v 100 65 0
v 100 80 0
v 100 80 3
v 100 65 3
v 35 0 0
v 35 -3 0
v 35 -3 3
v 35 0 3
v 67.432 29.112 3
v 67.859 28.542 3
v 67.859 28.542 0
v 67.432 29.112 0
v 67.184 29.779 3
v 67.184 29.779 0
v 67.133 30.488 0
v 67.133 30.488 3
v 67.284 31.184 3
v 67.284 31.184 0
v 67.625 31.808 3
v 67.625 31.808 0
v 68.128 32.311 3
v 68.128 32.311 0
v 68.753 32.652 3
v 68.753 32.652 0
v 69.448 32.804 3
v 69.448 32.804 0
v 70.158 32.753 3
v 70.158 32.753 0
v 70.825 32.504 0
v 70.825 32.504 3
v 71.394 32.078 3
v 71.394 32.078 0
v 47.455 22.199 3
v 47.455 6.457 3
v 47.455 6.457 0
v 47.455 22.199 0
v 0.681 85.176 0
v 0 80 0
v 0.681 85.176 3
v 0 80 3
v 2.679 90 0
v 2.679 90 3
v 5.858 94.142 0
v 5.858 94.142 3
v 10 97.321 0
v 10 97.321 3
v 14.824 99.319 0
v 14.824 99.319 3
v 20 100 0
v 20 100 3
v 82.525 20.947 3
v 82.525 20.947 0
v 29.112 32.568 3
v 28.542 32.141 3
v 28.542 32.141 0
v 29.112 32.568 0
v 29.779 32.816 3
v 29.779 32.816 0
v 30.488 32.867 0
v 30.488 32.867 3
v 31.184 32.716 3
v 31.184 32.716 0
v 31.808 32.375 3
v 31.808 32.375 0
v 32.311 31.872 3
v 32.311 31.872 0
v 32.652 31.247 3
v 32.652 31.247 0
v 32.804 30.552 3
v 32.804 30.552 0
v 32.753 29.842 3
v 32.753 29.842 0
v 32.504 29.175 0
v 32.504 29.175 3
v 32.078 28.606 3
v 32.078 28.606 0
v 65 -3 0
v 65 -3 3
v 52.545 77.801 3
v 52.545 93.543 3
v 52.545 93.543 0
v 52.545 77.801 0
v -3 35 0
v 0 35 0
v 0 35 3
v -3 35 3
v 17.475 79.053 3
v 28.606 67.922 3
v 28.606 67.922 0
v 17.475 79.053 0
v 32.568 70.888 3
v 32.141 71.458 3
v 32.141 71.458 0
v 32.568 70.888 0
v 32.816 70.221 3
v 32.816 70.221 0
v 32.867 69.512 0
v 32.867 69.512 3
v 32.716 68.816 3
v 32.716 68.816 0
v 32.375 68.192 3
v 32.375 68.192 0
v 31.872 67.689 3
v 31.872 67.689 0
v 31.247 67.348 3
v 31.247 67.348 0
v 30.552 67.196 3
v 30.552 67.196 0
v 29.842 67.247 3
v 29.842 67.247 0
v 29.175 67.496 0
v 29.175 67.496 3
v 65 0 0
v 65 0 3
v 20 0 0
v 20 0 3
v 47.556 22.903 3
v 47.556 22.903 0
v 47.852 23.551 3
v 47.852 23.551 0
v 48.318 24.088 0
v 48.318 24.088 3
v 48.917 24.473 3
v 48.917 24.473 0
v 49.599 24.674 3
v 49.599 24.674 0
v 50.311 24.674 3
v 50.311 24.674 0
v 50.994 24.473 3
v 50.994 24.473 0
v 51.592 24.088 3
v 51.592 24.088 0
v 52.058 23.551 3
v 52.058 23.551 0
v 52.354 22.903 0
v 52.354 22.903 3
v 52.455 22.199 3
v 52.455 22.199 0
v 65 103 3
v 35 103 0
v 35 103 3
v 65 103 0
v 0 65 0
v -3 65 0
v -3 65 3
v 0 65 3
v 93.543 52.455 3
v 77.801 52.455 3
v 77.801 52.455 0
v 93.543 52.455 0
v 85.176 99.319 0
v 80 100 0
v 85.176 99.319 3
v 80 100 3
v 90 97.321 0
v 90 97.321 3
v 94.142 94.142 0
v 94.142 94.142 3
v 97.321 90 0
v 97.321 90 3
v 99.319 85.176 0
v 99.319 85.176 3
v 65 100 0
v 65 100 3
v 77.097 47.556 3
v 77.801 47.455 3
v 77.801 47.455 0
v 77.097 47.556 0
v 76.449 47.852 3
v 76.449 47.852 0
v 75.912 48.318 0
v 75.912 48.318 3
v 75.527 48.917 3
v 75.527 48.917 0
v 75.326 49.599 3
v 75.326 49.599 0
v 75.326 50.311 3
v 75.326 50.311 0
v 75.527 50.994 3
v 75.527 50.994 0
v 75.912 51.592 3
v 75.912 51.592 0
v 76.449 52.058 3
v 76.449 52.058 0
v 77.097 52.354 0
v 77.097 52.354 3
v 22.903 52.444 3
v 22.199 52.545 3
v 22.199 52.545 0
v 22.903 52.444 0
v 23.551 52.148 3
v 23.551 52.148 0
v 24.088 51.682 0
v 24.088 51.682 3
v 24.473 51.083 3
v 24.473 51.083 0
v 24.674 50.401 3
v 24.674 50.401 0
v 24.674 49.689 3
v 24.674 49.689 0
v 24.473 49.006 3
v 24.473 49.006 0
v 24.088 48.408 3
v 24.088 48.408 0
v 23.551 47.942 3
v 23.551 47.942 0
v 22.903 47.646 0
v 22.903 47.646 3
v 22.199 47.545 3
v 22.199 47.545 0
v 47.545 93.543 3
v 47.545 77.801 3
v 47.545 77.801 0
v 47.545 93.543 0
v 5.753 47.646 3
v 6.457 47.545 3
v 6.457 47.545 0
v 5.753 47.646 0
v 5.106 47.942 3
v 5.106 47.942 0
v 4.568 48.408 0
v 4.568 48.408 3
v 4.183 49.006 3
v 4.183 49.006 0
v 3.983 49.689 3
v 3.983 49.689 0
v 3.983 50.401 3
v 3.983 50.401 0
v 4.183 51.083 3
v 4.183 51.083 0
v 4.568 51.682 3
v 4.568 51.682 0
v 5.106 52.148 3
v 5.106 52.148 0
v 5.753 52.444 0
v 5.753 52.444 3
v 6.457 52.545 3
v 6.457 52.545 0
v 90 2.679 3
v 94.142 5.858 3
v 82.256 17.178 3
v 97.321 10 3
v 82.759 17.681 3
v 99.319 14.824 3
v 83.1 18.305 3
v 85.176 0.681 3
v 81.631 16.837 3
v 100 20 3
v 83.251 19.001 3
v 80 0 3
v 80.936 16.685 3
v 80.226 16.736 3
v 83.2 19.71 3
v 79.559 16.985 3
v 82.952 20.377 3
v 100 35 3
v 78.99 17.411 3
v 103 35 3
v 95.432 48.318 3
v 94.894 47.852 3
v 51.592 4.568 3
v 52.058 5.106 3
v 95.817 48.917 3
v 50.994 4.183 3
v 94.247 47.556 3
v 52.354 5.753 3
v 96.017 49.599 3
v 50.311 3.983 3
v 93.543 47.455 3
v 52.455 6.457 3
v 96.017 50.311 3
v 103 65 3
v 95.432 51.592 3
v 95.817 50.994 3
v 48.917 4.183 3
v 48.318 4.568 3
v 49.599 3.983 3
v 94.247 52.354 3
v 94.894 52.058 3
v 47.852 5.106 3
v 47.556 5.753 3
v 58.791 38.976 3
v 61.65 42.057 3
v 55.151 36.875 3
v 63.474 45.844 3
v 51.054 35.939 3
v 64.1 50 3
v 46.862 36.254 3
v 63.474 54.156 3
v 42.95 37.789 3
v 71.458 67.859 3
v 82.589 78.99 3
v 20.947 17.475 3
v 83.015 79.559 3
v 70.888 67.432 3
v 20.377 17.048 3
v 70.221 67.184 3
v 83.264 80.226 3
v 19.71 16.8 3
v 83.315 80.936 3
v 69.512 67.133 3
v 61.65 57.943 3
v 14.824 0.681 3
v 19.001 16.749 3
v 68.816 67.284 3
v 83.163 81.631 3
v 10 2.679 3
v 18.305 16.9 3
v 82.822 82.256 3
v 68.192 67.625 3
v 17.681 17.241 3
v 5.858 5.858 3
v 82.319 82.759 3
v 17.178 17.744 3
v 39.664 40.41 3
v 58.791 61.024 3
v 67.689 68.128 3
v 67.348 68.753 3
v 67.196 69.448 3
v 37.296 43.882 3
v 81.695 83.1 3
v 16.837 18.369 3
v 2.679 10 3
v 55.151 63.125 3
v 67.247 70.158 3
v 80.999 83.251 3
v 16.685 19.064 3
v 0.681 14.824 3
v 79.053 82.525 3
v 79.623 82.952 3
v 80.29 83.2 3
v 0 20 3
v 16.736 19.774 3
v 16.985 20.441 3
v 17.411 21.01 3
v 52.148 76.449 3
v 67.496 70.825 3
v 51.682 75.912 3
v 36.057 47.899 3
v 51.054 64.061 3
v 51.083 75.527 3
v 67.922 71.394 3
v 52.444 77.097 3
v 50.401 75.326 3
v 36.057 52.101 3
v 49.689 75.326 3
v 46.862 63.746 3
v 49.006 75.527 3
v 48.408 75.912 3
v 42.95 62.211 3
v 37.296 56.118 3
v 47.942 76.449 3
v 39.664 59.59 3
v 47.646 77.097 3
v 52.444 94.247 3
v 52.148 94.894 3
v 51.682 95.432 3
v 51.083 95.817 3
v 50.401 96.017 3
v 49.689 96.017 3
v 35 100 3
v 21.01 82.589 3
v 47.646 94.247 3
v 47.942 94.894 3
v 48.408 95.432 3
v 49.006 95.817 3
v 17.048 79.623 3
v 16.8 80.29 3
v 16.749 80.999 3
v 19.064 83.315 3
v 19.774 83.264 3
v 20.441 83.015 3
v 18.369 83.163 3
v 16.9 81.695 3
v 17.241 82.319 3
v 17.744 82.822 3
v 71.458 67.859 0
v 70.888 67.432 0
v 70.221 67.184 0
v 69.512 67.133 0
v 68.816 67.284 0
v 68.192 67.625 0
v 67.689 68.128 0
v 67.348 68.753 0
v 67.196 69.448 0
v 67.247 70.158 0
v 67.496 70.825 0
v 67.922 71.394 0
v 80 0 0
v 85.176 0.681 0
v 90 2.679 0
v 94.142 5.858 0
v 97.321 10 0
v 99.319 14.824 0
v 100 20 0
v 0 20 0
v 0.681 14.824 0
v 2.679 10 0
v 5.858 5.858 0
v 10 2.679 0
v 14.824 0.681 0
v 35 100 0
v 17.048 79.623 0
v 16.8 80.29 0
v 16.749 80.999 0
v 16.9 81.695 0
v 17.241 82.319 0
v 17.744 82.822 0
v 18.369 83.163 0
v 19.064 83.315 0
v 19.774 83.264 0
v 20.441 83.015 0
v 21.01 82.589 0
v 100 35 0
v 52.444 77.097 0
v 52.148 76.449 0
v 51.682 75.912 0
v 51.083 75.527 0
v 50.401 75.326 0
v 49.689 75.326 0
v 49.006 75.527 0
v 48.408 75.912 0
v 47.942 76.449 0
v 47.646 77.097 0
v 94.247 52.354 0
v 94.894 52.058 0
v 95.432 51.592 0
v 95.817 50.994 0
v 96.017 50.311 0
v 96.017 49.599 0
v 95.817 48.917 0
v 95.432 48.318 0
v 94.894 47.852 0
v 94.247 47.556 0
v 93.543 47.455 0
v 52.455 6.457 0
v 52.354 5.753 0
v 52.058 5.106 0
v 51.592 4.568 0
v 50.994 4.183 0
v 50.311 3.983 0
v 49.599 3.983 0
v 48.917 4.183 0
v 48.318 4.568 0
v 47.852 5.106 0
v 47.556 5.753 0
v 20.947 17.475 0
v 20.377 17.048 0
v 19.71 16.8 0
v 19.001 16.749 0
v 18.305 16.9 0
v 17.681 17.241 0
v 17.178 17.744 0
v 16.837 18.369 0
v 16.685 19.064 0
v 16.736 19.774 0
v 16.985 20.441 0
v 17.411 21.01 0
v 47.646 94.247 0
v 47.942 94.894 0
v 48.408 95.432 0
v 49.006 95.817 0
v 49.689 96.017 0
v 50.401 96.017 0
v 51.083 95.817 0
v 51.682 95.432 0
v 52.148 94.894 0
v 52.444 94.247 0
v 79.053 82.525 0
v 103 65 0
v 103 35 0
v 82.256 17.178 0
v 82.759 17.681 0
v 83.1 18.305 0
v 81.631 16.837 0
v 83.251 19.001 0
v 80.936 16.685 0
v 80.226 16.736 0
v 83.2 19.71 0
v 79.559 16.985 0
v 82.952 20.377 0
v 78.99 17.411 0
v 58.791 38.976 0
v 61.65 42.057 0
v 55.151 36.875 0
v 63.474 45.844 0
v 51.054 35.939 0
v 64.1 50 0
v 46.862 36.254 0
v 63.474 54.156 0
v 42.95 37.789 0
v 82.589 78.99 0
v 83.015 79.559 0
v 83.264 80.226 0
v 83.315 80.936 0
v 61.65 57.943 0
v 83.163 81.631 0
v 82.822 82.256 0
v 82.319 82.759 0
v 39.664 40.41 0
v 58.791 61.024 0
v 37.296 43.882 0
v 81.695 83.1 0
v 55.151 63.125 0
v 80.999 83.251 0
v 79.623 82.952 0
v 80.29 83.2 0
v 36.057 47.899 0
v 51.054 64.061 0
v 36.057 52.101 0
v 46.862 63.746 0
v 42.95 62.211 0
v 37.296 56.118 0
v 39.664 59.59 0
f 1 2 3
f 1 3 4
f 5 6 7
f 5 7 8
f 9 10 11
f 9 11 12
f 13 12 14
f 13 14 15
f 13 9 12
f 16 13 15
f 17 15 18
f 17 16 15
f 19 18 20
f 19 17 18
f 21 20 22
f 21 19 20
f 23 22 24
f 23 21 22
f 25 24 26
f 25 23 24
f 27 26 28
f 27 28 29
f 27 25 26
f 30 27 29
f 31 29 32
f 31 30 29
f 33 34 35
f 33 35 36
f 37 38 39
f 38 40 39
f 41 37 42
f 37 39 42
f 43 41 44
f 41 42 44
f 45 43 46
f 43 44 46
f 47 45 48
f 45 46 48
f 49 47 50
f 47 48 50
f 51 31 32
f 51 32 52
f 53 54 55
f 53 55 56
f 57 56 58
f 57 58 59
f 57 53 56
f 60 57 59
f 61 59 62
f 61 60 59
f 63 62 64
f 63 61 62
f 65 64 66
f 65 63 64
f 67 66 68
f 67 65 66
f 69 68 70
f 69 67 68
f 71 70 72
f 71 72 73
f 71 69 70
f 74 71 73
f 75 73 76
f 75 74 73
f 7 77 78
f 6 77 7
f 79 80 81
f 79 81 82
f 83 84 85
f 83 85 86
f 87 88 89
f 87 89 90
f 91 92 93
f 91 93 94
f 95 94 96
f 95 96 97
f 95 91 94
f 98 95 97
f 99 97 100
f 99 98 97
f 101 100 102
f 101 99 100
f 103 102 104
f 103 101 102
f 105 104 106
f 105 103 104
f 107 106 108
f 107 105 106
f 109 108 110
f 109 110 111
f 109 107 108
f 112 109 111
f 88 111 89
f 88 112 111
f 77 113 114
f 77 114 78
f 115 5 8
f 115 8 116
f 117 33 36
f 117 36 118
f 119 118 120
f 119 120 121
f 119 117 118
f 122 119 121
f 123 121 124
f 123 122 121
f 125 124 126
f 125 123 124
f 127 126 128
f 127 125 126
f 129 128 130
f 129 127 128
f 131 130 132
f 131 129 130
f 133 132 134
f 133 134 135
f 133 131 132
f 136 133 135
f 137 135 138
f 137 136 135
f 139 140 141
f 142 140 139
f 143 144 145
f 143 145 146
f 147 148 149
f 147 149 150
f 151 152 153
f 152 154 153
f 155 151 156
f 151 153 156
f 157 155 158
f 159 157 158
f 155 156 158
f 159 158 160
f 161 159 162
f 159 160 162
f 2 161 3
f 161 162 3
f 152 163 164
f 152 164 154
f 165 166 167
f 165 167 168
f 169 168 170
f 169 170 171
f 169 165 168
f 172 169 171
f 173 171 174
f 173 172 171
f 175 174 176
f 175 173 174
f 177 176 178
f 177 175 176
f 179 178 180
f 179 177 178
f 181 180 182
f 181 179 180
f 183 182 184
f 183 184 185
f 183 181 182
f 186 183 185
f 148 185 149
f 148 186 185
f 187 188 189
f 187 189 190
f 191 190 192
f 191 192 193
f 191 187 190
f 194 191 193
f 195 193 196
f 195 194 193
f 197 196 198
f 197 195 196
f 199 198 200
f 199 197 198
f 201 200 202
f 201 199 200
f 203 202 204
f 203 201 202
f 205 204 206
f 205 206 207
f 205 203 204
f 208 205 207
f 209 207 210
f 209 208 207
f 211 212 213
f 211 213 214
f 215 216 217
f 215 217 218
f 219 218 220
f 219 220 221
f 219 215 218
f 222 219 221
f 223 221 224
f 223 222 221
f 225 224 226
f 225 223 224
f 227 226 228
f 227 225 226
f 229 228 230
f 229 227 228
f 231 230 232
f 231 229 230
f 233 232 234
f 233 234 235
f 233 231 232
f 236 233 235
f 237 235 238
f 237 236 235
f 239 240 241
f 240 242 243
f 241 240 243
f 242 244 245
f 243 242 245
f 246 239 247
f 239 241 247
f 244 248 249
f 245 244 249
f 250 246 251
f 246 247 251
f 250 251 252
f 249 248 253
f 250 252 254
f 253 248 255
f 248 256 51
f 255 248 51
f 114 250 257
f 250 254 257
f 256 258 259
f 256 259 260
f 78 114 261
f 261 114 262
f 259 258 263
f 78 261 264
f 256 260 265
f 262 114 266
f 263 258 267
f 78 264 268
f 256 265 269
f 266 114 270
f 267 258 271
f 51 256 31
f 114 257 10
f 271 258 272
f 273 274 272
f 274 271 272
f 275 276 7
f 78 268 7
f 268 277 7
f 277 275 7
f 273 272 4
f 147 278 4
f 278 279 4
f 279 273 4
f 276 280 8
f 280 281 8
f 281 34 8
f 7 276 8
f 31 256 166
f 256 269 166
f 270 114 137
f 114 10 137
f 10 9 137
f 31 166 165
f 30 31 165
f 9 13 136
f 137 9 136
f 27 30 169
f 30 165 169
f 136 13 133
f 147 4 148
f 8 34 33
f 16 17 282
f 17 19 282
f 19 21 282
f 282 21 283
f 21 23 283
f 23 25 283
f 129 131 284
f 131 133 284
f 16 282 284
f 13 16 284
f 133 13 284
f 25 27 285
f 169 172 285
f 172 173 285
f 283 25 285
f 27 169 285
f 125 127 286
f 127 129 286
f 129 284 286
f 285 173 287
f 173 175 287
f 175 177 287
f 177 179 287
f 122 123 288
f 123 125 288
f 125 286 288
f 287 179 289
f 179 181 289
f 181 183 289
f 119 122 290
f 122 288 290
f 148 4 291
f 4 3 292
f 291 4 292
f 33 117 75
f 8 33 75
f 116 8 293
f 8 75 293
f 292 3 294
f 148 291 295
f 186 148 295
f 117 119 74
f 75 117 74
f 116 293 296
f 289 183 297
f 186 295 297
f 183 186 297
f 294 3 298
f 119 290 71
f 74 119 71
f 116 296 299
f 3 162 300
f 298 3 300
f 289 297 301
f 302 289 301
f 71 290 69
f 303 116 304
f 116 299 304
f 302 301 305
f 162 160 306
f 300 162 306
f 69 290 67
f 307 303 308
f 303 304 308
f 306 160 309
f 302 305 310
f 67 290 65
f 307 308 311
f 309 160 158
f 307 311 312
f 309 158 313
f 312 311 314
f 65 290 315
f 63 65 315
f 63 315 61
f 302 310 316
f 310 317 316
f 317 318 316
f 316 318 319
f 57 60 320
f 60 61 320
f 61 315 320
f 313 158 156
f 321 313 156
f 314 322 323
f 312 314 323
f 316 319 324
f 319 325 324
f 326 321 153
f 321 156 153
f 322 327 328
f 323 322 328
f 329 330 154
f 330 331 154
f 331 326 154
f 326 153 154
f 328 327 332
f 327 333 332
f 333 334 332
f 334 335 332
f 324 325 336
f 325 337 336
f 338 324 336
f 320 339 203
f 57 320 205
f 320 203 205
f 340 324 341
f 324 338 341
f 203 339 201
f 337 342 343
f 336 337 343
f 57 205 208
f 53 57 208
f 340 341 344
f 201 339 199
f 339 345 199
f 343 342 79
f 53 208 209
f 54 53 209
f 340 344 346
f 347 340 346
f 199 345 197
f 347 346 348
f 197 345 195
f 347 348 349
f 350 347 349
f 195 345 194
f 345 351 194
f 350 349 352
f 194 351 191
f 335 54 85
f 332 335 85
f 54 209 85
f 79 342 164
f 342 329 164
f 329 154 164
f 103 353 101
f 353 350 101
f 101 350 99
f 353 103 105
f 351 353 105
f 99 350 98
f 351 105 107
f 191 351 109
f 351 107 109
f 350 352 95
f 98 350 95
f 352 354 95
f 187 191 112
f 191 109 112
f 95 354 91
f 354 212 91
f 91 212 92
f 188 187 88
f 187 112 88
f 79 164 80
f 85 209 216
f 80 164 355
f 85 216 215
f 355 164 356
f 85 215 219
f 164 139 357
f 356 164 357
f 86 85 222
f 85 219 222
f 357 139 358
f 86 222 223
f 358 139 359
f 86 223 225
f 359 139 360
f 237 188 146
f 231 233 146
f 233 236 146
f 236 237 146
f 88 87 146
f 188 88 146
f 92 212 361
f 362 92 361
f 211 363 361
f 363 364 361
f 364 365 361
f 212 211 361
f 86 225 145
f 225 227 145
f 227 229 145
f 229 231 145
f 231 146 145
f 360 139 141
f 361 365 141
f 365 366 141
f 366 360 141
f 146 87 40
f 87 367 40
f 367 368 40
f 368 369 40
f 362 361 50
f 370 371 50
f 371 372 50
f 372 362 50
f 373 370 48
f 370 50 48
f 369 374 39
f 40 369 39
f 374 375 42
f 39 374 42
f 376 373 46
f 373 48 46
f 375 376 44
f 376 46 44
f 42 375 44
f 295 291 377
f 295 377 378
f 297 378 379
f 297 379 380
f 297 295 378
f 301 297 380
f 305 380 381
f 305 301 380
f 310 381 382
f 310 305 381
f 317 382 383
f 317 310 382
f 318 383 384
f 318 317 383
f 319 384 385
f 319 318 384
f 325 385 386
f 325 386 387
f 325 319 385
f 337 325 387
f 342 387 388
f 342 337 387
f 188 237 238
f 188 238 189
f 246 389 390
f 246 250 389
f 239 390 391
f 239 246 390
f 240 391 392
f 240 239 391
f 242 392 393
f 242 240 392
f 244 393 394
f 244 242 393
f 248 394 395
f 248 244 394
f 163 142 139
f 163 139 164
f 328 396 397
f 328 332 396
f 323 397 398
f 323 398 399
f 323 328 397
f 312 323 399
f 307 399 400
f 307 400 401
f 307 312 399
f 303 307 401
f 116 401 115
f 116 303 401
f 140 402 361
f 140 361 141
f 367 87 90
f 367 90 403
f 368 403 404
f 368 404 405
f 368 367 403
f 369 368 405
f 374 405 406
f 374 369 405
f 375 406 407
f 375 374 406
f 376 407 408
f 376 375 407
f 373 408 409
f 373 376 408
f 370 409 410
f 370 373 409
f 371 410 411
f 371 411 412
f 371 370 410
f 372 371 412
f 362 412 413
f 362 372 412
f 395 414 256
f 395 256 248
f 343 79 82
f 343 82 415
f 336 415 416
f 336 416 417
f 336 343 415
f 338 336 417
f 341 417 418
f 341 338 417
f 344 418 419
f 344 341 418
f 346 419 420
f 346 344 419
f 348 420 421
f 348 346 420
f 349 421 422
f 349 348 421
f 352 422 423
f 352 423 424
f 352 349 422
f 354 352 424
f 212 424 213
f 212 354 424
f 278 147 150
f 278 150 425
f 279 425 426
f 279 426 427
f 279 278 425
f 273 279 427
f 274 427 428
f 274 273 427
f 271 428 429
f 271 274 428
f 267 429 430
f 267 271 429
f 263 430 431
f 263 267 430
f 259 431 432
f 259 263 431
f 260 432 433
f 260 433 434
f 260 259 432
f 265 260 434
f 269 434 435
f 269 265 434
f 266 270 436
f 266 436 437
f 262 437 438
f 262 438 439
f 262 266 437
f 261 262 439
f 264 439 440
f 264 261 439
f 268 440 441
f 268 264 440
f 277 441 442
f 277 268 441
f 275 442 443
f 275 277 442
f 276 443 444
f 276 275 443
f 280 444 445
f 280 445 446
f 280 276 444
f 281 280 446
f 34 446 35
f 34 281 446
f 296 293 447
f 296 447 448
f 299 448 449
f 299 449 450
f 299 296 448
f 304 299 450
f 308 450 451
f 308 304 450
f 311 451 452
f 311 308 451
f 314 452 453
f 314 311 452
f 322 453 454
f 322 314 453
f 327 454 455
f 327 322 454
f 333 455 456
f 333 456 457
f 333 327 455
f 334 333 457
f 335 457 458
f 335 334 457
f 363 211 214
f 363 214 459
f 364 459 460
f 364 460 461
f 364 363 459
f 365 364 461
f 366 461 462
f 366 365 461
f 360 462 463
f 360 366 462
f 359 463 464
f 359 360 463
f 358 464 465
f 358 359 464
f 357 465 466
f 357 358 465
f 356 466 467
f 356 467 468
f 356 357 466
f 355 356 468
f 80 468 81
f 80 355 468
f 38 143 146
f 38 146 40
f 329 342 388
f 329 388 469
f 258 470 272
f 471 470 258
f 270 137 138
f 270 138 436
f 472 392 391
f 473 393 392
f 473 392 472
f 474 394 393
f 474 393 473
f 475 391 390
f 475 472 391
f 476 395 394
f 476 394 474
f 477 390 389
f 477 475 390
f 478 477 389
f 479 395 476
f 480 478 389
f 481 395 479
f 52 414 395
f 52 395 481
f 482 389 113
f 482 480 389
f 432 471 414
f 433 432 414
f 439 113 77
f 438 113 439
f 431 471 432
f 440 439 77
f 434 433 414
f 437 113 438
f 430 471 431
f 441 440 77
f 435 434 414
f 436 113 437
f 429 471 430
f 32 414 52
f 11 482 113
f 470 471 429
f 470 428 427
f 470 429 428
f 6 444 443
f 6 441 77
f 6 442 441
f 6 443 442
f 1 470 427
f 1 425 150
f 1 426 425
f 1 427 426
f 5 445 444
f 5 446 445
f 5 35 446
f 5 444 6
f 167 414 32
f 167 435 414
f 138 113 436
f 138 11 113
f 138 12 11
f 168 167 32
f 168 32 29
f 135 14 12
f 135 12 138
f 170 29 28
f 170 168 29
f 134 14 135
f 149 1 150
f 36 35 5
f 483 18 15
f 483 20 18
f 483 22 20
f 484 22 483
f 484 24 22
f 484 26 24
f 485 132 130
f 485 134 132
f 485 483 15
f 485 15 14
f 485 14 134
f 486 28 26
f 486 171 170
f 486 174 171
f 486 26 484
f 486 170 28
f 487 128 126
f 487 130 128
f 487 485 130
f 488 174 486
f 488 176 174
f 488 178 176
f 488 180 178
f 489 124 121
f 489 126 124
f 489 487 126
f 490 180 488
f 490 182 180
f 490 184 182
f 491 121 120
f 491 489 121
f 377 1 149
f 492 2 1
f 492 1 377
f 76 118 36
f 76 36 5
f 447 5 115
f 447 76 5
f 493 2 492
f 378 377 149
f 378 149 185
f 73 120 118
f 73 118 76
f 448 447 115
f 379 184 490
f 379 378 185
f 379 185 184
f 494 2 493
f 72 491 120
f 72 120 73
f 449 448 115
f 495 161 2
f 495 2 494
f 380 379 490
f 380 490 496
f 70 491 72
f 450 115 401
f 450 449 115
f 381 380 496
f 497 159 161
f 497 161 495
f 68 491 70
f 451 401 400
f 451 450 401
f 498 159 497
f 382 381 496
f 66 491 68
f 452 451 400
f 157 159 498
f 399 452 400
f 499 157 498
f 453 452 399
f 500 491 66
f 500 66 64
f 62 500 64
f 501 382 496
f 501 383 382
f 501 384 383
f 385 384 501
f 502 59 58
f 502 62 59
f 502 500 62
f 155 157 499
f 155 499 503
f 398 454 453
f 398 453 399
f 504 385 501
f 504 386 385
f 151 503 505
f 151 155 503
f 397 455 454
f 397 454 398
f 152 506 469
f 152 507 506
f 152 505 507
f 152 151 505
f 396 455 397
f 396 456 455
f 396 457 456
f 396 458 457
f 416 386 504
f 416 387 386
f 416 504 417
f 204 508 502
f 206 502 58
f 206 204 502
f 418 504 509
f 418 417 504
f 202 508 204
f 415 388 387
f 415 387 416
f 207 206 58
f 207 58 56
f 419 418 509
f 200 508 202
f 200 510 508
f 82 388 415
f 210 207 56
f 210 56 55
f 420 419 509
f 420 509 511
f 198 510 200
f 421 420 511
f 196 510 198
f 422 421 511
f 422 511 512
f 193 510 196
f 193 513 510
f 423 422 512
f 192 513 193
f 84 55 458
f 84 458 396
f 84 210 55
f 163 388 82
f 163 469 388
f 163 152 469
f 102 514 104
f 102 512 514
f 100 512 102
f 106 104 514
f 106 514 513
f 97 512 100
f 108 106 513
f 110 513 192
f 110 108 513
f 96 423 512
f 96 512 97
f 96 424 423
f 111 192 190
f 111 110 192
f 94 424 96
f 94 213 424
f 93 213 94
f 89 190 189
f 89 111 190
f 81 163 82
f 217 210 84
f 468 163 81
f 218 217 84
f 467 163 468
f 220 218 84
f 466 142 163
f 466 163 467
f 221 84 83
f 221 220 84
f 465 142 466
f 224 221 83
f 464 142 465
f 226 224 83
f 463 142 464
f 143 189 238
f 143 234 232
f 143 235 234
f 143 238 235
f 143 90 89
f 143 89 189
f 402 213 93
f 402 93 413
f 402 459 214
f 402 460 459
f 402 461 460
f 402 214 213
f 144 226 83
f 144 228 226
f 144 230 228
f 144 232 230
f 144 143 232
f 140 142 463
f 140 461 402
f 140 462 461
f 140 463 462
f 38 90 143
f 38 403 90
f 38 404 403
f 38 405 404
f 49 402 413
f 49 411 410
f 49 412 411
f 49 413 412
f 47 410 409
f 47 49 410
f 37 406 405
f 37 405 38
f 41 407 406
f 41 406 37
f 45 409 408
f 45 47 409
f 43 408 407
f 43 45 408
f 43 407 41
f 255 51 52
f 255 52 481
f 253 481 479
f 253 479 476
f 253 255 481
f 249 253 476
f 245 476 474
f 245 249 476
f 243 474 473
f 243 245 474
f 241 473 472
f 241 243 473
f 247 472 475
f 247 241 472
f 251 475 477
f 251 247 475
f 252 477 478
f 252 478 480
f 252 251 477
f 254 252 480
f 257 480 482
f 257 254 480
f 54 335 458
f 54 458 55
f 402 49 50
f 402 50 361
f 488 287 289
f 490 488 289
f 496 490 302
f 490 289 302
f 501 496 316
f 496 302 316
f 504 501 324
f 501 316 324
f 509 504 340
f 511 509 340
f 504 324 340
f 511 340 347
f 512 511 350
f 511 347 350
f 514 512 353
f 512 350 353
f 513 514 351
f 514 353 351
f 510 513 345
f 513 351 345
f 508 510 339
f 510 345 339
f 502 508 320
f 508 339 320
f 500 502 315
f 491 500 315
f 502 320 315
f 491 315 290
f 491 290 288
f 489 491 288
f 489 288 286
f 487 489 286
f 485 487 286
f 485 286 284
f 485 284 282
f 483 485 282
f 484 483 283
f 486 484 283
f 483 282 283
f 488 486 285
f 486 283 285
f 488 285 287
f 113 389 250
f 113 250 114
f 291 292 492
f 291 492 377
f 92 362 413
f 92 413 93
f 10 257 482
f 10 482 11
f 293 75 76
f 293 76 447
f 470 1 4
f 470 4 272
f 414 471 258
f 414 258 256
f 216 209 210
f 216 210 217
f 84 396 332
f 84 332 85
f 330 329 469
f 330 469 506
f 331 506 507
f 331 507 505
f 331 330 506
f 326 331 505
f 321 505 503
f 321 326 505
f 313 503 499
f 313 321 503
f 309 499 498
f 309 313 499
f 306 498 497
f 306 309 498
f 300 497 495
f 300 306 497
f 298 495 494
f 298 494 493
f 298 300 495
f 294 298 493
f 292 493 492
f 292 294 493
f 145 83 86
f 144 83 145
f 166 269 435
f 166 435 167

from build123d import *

# Parameters (mm, degrees)
BOSS_EXTRU_1_DEPTH           = 3
ESQUISSE2_R                  = 14.1
ENL_V_MAT_EXTRU_1_DEPTH      = 3
CONG_1_R                     = 20
ENL_V_MAT_EXTRU_2_DEPTH      = 3
R_P_TITION_CIRCULAIRE1_COUNT = 8


with BuildPart() as part:
    # Esquisse1 → Boss.-Extru.1 (new body)
    with BuildSketch(Plane.XY):
        Polygon((0, 0), (0, 35), (-3, 35), (-3, 65), (0, 65), (0, 100), (35, 100), (35, 103), (65, 103), (65, 100), (100, 100), (100, 65), (103, 65), (103, 35), (100, 35), (100, 0), (65, 0), (65, -3), (35, -3), (35, 0), align=None)
    extrude(amount=BOSS_EXTRU_1_DEPTH)

    # Esquisse2 → Enlèv. mat.-Extru.1 (cut)
    with BuildSketch(Plane.XY.offset(3)):
        with Locations((50, 50)):
            Circle(ESQUISSE2_R)
    extrude(amount=-ENL_V_MAT_EXTRU_1_DEPTH, mode=Mode.SUBTRACT)

    # Congé1
    cong_1_edges = [part.edges().sort_by_distance(p)[0] for p in [
        (0, 0, 1.5),
        (0, 100, 1.5),
        (100, 100, 1.5),
        (100, 0, 1.5),
    ]]
    fillet(cong_1_edges, radius=CONG_1_R)

    # Esquisse4 → Enlèv. mat.-Extru.2 (cut)
    with BuildSketch(Plane.XY.offset(3)):
        with BuildLine():
            Line((52.544857736, 93.542670146), (52.544857736, 77.800875632))
            ThreePointArc((52.544857736, 77.800875632), (50.044857736, 75.300875632), (47.544857736, 77.800875632))
            Line((47.544857736, 77.800875632), (47.544857736, 93.542670146))
            ThreePointArc((47.544857736, 93.542670146), (50.044857736, 96.042670146), (52.544857736, 93.542670146))
        make_face()
    enl_v_mat_extru_2 = extrude(amount=-ENL_V_MAT_EXTRU_2_DEPTH, mode=Mode.SUBTRACT)

    # Répétition circulaire1: Enlèv. mat.-Extru.2 ×8 about axis
    r_p_tition_circulaire1_axis = Axis((50, 50, 0), (0, 0, 1))
    for i in range(1, R_P_TITION_CIRCULAIRE1_COUNT):
        add(enl_v_mat_extru_2.rotate(r_p_tition_circulaire1_axis, i * 360 / R_P_TITION_CIRCULAIRE1_COUNT), mode=Mode.SUBTRACT)


solid = part.part
